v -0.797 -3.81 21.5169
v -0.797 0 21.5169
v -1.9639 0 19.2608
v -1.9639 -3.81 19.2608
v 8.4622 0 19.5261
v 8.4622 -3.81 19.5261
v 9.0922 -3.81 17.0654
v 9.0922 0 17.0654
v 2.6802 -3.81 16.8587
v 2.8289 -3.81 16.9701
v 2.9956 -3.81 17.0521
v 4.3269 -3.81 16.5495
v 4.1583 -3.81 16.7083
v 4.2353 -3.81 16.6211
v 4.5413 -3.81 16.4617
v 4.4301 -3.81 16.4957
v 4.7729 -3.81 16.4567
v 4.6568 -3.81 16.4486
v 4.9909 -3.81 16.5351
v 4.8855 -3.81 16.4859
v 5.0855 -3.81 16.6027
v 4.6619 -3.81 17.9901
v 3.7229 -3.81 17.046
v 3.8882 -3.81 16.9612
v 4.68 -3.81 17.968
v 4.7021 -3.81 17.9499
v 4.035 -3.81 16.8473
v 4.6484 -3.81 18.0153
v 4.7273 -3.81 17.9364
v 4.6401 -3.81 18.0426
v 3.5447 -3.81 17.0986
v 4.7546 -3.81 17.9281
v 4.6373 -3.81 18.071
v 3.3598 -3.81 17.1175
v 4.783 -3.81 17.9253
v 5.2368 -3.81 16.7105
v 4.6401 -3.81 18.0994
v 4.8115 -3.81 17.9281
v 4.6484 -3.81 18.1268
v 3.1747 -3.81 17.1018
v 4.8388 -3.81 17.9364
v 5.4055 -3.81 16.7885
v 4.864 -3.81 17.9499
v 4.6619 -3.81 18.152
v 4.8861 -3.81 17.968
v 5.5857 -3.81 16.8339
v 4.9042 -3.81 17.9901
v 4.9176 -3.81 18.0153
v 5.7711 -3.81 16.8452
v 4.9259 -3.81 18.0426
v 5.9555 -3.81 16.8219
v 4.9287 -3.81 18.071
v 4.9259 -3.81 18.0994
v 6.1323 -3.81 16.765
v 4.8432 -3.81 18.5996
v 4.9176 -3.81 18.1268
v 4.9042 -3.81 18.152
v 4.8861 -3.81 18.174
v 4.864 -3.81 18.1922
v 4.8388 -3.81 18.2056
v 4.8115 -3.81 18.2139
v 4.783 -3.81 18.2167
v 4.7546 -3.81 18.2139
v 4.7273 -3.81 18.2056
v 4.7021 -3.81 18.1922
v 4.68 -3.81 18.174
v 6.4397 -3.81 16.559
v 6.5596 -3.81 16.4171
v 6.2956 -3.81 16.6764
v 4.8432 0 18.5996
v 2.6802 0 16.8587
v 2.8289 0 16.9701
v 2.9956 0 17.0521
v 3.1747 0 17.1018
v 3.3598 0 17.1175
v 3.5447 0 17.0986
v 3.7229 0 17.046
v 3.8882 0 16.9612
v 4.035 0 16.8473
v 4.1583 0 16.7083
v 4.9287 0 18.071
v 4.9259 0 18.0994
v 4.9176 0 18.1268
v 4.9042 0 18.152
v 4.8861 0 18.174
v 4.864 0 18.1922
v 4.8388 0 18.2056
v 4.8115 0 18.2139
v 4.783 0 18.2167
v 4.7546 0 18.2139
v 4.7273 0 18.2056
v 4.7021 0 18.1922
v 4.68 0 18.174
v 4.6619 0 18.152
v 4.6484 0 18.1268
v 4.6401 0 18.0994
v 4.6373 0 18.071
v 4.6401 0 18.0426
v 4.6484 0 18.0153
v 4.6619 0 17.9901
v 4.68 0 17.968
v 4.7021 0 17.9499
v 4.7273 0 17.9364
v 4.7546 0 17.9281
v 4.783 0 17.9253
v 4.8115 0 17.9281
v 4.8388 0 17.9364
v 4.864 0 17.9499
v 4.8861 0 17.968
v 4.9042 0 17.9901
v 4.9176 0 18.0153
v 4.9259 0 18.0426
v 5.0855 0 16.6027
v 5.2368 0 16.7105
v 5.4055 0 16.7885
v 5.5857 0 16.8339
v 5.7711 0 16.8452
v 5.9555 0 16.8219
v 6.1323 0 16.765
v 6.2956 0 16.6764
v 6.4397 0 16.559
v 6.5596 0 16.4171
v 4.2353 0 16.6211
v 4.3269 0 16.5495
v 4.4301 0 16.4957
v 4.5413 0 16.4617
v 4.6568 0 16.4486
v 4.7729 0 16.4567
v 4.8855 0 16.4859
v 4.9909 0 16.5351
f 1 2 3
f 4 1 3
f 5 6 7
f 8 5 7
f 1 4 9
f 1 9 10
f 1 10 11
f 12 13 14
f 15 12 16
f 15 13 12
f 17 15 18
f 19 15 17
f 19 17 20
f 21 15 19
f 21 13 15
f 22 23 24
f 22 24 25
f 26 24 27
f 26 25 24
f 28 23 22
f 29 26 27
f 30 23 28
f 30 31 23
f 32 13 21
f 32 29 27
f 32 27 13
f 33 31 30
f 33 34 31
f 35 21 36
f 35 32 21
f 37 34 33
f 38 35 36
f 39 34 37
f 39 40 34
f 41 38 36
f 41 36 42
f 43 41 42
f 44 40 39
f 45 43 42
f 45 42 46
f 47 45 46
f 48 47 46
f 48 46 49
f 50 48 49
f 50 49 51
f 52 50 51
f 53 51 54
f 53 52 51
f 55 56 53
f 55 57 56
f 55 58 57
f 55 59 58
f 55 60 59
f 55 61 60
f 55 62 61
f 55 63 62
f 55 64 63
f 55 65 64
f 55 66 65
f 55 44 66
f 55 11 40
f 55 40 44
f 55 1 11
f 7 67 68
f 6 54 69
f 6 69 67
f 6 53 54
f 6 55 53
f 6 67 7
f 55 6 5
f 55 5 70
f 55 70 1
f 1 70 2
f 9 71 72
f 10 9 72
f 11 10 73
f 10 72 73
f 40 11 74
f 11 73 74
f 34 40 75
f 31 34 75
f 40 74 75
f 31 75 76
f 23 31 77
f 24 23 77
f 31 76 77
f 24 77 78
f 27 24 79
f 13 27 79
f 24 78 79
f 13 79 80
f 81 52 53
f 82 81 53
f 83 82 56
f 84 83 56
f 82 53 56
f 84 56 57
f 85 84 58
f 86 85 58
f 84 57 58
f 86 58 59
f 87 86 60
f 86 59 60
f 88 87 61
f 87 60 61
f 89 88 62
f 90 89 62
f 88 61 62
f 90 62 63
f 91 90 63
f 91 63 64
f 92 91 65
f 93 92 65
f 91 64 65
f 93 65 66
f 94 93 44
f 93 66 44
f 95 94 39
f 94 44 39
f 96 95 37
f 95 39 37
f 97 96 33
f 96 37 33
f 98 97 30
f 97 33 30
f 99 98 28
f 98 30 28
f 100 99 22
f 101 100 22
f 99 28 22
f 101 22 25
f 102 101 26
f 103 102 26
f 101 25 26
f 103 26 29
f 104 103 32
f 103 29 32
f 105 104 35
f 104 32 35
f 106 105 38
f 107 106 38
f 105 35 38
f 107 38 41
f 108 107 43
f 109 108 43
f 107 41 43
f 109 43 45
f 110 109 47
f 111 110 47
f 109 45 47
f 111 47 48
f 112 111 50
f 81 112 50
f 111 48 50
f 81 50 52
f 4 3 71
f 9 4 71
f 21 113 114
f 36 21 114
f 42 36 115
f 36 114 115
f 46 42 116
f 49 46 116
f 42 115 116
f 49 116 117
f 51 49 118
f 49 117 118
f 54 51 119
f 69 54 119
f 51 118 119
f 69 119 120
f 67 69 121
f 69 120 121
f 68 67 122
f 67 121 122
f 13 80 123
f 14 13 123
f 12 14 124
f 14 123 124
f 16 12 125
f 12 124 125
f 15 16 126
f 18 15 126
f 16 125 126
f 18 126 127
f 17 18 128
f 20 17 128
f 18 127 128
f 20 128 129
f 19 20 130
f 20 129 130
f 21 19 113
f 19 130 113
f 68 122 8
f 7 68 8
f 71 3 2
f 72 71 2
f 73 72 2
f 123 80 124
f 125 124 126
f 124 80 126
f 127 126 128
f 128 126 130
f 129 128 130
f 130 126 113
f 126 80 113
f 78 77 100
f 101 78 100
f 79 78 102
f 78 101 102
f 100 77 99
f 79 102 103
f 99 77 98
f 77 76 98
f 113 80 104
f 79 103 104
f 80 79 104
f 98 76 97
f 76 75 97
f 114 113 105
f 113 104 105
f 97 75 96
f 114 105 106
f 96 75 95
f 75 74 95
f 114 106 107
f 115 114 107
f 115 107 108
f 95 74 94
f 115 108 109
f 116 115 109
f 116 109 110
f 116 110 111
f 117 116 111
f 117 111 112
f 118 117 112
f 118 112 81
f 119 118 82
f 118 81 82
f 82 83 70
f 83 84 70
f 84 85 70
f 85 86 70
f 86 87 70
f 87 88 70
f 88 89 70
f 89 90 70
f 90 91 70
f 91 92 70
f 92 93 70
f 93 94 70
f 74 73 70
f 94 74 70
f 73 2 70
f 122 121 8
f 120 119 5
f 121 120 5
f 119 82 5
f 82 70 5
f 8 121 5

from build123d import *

# Parameters (mm, degrees)
F1_DEPTH = 3.81
F2_R     = 0.1456869123
F3_DEPTH = 3.81
F5_DEPTH = 25.4


with BuildPart() as f1:
    # F0 (on Front) → F1 (new body)
    with BuildSketch(Plane.XZ):
        with BuildLine():
            Line((4.8432132158, 18.5995820194), (-0.7969688229, 21.5169175451))
            Line((-0.7969688229, 21.5169175451), (-1.9639030332, 19.2608447295))
            Line((-1.9639030332, 19.2608447295), (2.6801745949, 16.8587356211))
            ThreePointArc((2.6801745949, 16.8587356211), (3.4526909685, 17.1123534538), (4.1582529007, 16.708266938))
            ThreePointArc((4.1582529007, 16.708266938), (4.5987642694, 16.4524828685), (5.0854991089, 16.6026992195))
            ThreePointArc((5.0854991089, 16.6026992195), (5.8638378577, 16.8378424622), (6.5595735586, 16.4170629629))
            Line((6.5595735586, 16.4170629629), (11.6247636885, 17.7137642129))
            Line((11.6247636885, 17.7137642129), (10.9948318325, 20.1744116595))
            Line((10.9948318325, 20.1744116595), (4.8432132158, 18.5995820194))
        make_face()
    extrude(amount=F1_DEPTH)

    # F2 (on face) → F3 (cut, through all)
    with BuildSketch(Plane.XZ.offset(3.81)):
        with Locations((4.7830365223, 18.0710245049)):
            Circle(F2_R)
    extrude(amount=-F3_DEPTH, mode=Mode.SUBTRACT)

    # F4 (on face) → F5 (cut)
    with BuildSketch(Plane.XZ.offset(3.81)):
        Polygon((11.6247636885, 17.7137642129), (10.9948318325, 20.1744116595), (8.4622367675, 19.5260610345), (9.0921686236, 17.0654135879), align=None)
    extrude(amount=-F5_DEPTH, mode=Mode.SUBTRACT)


solid = f1.part
